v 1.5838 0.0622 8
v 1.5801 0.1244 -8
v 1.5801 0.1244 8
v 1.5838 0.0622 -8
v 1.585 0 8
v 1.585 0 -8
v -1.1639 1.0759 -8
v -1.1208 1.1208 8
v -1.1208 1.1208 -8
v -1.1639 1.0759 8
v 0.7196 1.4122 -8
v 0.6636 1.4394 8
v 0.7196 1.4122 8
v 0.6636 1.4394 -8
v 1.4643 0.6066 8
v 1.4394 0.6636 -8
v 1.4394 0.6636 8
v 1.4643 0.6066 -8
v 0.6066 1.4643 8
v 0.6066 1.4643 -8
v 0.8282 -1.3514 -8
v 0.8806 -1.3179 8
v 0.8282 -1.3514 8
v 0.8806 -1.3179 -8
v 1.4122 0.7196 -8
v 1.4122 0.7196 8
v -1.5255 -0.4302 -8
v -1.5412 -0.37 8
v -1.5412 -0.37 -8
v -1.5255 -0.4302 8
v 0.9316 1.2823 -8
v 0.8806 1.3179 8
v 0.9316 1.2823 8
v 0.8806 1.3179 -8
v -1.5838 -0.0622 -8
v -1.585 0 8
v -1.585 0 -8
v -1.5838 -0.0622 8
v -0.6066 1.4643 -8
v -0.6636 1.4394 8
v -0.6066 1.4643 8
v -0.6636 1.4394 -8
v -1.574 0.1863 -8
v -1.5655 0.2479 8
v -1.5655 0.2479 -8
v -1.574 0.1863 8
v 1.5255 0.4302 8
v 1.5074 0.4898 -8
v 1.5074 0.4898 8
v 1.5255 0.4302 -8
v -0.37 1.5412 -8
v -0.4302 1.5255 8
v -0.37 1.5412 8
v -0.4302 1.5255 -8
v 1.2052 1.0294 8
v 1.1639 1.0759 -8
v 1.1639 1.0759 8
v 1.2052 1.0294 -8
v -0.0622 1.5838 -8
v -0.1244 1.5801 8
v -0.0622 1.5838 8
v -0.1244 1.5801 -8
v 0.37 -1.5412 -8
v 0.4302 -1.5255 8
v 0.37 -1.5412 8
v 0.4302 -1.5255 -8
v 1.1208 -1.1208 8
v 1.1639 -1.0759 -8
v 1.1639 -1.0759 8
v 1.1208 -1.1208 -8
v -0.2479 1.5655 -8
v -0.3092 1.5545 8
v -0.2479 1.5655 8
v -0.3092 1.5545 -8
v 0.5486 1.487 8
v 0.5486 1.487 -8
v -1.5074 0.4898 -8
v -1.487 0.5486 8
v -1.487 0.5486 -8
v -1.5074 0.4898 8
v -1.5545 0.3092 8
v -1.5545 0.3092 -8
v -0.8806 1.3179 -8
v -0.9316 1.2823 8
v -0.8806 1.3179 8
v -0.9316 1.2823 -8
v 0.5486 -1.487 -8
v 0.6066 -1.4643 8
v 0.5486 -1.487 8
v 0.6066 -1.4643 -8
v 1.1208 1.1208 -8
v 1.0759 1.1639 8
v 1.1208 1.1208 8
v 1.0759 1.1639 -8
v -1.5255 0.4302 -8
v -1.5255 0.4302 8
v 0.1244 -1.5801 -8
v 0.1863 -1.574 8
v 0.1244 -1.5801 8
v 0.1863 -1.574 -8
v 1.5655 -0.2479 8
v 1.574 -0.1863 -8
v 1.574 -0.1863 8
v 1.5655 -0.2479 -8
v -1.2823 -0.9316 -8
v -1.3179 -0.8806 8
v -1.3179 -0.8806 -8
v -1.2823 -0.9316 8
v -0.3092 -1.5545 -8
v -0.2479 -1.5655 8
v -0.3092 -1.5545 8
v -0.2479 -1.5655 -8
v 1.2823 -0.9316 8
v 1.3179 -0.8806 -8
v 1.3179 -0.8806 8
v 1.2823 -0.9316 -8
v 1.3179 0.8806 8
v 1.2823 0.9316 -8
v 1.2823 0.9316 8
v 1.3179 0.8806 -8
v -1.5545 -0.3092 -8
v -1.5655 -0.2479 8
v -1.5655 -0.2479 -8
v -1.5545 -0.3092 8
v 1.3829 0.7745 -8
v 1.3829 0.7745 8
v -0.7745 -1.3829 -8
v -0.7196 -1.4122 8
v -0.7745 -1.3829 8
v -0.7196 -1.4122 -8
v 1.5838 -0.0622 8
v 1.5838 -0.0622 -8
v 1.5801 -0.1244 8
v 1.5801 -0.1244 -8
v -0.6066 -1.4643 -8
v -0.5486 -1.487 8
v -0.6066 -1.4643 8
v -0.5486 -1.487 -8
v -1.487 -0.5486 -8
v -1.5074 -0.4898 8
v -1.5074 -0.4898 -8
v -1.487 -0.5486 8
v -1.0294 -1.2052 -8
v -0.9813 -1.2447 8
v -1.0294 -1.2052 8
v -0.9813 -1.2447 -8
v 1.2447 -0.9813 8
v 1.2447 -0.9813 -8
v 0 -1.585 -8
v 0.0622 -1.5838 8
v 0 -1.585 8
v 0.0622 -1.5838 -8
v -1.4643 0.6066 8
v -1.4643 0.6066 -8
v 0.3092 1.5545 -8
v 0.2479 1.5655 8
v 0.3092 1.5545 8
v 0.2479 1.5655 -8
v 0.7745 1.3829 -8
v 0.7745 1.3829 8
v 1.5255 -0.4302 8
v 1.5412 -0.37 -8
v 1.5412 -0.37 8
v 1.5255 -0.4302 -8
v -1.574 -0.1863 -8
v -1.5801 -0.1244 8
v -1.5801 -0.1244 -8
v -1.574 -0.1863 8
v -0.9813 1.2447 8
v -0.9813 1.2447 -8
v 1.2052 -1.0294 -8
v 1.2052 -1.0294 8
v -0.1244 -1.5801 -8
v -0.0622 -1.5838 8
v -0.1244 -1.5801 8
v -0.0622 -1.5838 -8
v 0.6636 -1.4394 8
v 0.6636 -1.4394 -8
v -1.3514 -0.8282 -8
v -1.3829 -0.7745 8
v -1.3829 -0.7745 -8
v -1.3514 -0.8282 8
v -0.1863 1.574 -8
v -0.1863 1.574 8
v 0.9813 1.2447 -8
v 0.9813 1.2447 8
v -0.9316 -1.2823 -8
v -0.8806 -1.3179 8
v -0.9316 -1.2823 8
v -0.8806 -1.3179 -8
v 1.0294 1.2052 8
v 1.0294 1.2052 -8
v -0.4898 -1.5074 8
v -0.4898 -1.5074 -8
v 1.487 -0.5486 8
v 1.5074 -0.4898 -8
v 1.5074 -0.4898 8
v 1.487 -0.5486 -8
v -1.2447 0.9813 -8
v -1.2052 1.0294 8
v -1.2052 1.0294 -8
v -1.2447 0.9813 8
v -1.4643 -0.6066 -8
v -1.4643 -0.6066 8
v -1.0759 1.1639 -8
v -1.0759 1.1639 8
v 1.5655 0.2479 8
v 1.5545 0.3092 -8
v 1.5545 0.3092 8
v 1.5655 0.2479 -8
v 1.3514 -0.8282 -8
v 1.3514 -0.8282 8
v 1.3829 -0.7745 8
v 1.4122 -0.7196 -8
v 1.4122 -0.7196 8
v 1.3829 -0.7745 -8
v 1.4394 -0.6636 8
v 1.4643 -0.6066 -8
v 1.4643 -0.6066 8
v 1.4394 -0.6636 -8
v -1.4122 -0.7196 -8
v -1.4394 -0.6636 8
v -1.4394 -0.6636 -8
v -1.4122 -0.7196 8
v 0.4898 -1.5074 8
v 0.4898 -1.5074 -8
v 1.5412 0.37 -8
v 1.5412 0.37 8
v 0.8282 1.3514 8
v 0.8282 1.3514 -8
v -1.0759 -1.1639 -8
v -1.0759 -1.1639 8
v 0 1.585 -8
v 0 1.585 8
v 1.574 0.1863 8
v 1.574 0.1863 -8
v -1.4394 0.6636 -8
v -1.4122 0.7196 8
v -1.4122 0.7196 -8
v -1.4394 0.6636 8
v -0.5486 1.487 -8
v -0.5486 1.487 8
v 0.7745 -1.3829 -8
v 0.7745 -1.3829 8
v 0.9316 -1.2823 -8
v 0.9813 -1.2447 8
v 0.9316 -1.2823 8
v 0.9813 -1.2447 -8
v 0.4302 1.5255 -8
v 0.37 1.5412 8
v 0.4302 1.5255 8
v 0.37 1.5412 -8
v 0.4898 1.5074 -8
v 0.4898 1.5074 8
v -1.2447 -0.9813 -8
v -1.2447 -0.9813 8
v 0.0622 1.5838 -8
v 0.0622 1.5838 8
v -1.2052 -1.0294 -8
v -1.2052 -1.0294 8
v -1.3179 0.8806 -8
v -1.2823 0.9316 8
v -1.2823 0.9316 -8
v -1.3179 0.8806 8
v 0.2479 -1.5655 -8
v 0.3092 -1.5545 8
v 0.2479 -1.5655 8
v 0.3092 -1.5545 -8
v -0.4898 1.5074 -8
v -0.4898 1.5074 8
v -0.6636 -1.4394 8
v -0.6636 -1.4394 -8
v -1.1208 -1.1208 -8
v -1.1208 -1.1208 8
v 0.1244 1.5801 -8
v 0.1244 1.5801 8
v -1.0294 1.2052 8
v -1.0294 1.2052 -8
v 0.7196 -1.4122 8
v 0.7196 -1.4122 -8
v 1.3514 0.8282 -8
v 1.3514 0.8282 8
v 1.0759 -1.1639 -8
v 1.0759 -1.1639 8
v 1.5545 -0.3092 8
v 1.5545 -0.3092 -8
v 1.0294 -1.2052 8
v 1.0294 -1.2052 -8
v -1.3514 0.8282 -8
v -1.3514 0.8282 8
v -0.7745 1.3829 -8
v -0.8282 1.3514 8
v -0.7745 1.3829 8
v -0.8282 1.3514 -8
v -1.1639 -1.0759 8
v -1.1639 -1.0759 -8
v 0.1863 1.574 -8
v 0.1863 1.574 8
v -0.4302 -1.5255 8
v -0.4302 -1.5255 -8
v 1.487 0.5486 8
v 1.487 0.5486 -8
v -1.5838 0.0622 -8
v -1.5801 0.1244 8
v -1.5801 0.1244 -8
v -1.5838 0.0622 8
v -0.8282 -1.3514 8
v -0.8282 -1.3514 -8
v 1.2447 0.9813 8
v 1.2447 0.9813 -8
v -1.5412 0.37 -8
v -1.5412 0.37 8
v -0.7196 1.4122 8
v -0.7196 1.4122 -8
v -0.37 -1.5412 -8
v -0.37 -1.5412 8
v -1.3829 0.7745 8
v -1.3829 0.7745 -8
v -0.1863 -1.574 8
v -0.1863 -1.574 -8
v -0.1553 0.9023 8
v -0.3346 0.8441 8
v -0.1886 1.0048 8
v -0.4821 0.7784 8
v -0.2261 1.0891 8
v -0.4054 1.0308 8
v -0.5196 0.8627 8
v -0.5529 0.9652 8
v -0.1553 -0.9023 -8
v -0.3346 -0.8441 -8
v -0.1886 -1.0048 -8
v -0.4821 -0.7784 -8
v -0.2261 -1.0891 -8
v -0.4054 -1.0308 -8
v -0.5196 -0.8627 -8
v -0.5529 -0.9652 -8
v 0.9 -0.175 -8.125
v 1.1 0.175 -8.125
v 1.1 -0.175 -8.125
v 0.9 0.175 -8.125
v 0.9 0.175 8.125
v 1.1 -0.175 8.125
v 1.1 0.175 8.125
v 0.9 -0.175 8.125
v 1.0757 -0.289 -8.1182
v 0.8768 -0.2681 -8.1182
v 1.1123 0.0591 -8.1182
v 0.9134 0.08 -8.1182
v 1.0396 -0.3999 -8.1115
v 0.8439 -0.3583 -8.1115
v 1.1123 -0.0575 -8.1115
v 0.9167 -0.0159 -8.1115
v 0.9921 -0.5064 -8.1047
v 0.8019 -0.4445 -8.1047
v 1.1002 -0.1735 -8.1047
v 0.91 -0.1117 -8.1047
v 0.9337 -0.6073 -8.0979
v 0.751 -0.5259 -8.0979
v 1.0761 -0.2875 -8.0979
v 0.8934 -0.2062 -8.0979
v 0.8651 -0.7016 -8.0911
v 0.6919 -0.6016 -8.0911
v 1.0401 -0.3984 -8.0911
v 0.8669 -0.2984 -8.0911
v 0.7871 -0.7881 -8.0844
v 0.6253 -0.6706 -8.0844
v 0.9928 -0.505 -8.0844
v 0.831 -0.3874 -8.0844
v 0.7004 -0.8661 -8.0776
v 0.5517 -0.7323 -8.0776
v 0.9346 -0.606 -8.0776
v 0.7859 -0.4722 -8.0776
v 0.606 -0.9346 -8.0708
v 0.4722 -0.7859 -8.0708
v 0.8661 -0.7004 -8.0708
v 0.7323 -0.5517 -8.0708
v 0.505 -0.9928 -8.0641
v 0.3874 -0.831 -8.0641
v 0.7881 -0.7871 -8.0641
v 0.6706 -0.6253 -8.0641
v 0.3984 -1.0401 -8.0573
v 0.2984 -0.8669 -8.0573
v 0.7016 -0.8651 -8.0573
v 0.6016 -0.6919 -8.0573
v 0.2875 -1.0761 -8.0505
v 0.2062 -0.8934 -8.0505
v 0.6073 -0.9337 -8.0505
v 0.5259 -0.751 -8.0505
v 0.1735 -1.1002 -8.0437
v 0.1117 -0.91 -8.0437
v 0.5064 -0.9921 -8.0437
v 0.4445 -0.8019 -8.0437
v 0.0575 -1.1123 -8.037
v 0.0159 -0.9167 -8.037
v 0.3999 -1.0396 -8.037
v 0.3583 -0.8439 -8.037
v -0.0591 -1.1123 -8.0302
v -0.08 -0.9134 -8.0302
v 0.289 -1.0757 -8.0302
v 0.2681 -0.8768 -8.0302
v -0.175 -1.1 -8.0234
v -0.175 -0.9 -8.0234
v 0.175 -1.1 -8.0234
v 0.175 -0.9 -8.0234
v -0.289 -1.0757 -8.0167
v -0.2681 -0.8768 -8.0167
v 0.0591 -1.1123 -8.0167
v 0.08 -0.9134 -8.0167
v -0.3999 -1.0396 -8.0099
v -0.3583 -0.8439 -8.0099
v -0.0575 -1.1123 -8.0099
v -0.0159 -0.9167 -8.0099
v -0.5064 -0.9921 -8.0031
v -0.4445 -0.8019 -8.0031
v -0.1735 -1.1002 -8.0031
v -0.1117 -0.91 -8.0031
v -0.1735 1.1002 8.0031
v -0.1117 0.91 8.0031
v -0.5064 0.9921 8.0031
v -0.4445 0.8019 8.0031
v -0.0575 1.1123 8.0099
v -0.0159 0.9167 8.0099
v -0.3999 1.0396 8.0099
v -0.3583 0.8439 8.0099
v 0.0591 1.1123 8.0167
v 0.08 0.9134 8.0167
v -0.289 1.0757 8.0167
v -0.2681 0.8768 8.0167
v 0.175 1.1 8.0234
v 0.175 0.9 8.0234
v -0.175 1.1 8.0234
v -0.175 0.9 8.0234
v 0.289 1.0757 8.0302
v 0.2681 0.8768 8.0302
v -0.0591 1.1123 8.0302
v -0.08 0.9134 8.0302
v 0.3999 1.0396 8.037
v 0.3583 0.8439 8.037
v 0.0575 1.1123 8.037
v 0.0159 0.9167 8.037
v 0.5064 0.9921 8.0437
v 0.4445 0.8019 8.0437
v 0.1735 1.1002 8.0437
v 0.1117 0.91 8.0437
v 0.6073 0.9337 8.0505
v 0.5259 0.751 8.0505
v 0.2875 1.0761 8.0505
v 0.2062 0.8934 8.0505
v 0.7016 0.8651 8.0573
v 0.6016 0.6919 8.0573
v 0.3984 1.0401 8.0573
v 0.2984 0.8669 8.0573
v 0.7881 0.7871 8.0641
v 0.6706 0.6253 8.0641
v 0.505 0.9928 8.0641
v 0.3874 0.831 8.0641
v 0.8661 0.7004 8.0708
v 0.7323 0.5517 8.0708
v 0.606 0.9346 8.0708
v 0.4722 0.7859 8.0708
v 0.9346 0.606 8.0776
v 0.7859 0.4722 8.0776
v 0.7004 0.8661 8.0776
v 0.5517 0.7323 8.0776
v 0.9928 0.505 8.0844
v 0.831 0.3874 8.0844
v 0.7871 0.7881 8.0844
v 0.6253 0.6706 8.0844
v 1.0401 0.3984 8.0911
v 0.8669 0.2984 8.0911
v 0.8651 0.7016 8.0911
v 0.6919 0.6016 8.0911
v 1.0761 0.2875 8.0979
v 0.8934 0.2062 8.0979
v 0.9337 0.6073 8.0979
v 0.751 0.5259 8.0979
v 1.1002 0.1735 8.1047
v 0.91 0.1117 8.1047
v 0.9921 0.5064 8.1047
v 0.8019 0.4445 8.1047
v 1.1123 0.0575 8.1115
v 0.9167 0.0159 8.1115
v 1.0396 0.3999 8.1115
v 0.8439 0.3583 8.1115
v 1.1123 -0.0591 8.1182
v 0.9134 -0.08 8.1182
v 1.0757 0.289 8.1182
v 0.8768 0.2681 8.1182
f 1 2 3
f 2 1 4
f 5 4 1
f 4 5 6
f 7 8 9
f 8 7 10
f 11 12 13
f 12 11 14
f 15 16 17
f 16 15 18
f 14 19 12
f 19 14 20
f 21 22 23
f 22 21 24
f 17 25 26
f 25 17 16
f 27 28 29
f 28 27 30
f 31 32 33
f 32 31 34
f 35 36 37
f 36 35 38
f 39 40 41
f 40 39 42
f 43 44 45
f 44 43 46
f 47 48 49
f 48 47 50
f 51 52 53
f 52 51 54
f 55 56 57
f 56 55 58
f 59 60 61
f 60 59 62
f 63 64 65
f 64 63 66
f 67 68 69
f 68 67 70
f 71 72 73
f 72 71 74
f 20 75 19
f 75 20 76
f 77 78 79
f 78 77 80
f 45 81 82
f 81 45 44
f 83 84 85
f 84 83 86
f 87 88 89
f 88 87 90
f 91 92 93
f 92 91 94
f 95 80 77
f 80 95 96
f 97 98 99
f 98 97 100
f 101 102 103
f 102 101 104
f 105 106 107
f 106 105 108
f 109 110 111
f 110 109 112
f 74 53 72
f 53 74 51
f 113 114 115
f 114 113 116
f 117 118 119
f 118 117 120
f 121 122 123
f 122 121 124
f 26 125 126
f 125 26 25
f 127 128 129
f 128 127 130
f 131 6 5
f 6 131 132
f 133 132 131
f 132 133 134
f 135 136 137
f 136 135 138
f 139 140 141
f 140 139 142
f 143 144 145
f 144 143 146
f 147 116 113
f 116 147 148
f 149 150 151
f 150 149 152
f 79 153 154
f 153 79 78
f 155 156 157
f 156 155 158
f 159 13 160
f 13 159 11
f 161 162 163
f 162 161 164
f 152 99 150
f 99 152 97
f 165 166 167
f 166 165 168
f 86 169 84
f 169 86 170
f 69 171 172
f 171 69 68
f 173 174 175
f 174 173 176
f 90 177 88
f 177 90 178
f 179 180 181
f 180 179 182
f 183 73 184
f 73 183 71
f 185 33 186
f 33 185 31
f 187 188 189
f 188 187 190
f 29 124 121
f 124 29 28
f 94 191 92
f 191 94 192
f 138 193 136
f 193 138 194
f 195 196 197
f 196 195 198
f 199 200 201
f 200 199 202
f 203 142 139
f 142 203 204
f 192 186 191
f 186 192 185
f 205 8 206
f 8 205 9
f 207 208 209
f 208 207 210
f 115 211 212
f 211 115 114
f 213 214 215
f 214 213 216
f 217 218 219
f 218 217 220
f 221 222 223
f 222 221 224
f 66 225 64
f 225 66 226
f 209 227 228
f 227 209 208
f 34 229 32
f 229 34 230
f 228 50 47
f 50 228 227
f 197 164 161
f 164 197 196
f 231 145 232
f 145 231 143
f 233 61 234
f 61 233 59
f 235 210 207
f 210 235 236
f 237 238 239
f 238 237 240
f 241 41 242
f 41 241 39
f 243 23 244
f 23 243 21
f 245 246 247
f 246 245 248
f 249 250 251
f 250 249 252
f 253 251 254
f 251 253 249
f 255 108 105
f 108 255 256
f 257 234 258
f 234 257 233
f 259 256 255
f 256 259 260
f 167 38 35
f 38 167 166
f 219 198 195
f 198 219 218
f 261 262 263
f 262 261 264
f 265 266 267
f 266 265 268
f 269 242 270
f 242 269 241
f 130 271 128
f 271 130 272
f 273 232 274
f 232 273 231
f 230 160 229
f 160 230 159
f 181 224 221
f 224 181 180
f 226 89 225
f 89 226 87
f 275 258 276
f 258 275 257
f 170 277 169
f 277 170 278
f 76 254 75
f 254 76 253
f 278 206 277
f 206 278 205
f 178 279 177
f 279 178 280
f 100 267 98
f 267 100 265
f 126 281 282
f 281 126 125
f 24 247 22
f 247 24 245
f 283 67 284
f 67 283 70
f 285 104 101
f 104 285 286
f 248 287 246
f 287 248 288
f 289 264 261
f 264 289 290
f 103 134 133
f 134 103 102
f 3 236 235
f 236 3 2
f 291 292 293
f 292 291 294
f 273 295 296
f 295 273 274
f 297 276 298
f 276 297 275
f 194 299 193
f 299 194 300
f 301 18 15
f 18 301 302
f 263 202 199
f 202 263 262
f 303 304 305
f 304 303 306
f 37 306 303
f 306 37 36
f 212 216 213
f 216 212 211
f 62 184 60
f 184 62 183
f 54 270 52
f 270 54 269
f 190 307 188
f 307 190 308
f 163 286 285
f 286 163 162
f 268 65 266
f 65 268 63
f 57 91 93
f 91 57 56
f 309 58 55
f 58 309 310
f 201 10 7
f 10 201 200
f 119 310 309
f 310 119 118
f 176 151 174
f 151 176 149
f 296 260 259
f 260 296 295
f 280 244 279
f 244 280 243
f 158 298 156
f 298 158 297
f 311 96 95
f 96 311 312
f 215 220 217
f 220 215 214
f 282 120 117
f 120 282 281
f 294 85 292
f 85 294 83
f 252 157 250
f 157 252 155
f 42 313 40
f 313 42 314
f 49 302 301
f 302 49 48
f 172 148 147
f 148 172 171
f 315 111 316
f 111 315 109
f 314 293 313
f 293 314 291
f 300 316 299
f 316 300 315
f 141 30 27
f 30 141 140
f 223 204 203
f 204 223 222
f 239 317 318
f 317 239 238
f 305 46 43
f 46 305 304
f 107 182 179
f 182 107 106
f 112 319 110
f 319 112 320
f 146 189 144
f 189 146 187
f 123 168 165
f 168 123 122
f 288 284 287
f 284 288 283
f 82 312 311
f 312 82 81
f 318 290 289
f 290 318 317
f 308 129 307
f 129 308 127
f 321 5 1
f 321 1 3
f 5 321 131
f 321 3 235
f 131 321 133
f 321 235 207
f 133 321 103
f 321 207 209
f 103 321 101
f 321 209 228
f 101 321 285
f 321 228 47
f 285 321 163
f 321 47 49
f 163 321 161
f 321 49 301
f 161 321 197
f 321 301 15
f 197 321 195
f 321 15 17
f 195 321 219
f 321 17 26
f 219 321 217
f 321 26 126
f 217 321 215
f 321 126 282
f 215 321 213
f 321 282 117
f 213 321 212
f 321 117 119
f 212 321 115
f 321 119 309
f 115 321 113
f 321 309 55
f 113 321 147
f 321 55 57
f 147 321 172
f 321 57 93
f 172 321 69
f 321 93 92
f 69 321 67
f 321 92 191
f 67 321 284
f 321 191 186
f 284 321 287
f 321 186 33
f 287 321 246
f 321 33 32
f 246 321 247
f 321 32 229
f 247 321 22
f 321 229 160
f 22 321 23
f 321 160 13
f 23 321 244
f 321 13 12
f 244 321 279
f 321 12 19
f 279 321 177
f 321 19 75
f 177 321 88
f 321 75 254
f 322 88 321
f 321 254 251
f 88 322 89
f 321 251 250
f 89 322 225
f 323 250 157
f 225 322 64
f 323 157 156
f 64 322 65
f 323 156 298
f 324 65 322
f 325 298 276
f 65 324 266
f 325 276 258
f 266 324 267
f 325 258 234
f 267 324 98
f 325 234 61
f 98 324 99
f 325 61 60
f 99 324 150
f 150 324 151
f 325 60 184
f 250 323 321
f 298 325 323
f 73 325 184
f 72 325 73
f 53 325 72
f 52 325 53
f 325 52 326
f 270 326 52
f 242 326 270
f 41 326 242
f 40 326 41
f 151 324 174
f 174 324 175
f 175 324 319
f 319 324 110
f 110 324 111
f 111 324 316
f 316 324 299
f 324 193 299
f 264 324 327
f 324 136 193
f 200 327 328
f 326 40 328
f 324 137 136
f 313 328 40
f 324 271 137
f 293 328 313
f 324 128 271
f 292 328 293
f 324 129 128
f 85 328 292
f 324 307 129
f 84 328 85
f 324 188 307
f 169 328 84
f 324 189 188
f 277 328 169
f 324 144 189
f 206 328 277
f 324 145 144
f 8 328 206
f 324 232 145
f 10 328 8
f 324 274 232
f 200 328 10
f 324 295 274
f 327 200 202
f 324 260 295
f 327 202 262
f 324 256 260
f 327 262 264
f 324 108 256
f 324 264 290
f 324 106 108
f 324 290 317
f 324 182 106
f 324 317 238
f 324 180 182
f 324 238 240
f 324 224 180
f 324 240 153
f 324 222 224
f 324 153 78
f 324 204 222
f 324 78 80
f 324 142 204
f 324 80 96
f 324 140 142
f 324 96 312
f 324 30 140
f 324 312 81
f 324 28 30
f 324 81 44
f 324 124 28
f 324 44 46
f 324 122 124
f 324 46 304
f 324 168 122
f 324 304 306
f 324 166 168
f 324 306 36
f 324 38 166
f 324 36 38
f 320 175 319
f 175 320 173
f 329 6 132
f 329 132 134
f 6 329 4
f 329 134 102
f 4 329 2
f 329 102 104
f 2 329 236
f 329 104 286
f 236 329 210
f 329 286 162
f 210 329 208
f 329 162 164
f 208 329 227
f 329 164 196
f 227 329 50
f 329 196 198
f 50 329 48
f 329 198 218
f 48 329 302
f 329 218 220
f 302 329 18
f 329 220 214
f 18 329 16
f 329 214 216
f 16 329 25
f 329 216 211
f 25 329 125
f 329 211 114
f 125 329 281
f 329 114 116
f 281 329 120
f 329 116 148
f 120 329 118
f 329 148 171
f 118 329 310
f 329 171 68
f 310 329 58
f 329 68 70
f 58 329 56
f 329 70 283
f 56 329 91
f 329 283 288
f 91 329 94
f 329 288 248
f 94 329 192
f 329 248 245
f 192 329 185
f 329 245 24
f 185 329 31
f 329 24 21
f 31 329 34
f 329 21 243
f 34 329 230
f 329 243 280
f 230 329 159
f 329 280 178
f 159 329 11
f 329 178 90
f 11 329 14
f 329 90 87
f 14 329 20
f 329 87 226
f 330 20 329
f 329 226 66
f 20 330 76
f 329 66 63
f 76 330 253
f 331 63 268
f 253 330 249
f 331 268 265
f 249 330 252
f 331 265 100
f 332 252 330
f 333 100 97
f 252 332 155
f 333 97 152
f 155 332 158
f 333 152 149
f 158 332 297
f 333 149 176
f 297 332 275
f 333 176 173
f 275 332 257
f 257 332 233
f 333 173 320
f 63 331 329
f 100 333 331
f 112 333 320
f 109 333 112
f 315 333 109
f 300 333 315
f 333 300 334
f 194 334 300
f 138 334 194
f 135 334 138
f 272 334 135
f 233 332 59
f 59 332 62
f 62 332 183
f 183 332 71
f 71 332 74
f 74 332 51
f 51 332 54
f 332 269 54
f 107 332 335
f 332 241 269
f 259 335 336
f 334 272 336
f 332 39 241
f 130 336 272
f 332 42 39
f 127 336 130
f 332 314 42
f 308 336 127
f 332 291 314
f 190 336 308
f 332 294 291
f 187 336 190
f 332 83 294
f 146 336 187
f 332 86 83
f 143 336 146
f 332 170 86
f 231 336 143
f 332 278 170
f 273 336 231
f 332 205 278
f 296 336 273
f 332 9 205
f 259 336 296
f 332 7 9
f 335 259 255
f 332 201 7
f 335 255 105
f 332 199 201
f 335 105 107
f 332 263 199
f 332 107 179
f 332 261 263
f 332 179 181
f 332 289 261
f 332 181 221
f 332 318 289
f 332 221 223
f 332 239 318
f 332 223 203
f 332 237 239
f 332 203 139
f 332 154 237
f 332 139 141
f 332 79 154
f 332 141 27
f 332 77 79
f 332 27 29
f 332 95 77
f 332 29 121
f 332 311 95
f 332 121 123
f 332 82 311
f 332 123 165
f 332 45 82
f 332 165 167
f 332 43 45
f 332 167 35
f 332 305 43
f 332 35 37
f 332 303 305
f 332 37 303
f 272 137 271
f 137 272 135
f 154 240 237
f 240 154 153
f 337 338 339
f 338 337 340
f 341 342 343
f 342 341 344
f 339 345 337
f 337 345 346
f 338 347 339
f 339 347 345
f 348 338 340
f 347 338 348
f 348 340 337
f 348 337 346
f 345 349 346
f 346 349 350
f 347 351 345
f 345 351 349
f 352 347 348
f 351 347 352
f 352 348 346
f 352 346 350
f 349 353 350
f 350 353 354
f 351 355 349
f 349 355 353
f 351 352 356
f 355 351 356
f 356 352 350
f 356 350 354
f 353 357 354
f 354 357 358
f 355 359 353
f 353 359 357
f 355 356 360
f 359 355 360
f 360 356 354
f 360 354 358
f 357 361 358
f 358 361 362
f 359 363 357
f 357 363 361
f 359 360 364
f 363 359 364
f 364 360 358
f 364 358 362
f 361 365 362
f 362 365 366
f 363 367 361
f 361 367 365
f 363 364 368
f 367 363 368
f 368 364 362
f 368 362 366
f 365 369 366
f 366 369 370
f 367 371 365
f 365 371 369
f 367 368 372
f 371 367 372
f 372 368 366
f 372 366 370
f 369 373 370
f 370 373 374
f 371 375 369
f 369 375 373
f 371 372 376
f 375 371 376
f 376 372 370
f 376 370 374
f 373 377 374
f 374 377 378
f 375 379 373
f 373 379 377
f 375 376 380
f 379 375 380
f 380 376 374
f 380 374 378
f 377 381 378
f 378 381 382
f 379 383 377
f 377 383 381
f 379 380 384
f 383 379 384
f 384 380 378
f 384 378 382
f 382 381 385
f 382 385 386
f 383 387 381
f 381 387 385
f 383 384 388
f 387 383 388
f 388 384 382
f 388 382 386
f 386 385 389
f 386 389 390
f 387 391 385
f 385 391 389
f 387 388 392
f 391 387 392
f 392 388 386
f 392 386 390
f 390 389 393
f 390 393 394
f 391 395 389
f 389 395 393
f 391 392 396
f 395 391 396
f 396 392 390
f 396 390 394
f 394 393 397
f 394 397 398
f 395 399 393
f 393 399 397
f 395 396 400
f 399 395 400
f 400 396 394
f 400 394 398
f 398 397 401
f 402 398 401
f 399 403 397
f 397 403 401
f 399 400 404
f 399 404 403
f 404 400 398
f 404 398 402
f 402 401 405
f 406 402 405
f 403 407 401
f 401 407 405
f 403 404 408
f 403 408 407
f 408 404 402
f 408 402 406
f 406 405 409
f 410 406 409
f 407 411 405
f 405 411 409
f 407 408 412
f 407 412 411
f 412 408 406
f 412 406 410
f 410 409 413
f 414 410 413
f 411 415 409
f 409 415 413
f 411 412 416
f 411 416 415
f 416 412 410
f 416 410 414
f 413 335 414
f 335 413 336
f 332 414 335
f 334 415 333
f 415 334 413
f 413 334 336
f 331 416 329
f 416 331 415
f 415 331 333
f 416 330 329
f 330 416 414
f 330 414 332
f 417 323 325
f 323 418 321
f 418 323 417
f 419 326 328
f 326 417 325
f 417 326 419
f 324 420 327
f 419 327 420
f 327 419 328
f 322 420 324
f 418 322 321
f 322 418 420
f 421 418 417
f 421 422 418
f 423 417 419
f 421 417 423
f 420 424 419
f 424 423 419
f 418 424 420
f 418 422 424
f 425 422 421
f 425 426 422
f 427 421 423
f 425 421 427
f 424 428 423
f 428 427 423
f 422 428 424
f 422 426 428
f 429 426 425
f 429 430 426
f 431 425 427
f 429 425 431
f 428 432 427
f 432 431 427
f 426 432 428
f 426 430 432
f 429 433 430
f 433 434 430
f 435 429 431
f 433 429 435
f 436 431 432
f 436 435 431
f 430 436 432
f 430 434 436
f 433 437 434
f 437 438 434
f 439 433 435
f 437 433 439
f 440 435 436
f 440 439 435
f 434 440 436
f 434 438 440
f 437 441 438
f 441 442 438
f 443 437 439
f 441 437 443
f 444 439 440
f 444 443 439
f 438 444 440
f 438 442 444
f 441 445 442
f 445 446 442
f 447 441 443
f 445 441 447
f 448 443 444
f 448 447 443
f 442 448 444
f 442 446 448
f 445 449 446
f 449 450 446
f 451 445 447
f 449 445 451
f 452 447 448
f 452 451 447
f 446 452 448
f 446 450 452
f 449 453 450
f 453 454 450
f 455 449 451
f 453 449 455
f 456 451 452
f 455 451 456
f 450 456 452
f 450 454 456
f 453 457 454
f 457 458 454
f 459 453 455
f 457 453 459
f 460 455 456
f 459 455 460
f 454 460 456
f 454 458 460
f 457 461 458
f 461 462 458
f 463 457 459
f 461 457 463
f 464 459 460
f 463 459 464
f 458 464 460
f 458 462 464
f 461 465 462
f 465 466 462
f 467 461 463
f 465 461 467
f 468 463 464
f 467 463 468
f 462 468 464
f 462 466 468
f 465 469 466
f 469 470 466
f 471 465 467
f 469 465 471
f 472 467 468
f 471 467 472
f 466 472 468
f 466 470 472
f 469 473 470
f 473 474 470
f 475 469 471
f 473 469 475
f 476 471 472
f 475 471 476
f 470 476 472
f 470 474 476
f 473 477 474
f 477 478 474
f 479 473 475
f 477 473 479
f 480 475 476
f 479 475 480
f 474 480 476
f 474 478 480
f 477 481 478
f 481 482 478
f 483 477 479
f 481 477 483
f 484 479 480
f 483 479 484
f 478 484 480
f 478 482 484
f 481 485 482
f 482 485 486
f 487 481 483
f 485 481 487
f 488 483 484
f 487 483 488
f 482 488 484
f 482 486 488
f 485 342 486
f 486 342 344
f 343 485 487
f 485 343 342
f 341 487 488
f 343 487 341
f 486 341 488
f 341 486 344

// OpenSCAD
// Standoff pillar with external M2.0-style thread
// Target: 2.0mm thread (major diameter), 16.0mm long, 3.17mm body diameter

$fn = 160;

// Parameters
thread_major_d_mm   = 2.0;   // M2 major diameter
thread_pitch_mm     = 0.4;   // coarse-ish visual pitch
length_mm           = 16.0;
body_d_mm           = 3.17;

threaded_length_mm  = 16.0;  // external thread length along the pillar
thread_depth_mm     = 0.20;  // radial height of thread above major diameter
thread_ridge_w_mm   = 0.35;  // ridge width (approx)
overlap_mm          = 0.25;  // small overlap to ensure watertight union

module external_thread(major_d, pitch, len, depth, ridge_w) {
    major_r = major_d/2;
    turns   = len / pitch;

    // Helical ridge: twist a small rectangle around Z at radius = major_r
    // Centered on Z=0 so it can be placed with a single translate.
    linear_extrude(
        height     = len + overlap_mm,
        twist      = 360 * turns,
        slices     = max(ceil(turns * 60), 120),
        convexity  = 10,
        center     = true
    )
        translate([major_r, 0, 0])
            square([depth, ridge_w], center = true);
}

module standoff_pillar() {
    tlen = min(threaded_length_mm, length_mm);

    union() {
        // Main body: exact required outer diameter and length
        cylinder(h = length_mm, d = body_d_mm, center = true);

        // External M2 thread ridge, centered and connected (overlaps body)
        if (tlen > 0)
            external_thread(
                major_d = thread_major_d_mm,
                pitch   = thread_pitch_mm,
                len     = tlen,
                depth   = thread_depth_mm,
                ridge_w = thread_ridge_w_mm
            );
    }
}

standoff_pillar();
